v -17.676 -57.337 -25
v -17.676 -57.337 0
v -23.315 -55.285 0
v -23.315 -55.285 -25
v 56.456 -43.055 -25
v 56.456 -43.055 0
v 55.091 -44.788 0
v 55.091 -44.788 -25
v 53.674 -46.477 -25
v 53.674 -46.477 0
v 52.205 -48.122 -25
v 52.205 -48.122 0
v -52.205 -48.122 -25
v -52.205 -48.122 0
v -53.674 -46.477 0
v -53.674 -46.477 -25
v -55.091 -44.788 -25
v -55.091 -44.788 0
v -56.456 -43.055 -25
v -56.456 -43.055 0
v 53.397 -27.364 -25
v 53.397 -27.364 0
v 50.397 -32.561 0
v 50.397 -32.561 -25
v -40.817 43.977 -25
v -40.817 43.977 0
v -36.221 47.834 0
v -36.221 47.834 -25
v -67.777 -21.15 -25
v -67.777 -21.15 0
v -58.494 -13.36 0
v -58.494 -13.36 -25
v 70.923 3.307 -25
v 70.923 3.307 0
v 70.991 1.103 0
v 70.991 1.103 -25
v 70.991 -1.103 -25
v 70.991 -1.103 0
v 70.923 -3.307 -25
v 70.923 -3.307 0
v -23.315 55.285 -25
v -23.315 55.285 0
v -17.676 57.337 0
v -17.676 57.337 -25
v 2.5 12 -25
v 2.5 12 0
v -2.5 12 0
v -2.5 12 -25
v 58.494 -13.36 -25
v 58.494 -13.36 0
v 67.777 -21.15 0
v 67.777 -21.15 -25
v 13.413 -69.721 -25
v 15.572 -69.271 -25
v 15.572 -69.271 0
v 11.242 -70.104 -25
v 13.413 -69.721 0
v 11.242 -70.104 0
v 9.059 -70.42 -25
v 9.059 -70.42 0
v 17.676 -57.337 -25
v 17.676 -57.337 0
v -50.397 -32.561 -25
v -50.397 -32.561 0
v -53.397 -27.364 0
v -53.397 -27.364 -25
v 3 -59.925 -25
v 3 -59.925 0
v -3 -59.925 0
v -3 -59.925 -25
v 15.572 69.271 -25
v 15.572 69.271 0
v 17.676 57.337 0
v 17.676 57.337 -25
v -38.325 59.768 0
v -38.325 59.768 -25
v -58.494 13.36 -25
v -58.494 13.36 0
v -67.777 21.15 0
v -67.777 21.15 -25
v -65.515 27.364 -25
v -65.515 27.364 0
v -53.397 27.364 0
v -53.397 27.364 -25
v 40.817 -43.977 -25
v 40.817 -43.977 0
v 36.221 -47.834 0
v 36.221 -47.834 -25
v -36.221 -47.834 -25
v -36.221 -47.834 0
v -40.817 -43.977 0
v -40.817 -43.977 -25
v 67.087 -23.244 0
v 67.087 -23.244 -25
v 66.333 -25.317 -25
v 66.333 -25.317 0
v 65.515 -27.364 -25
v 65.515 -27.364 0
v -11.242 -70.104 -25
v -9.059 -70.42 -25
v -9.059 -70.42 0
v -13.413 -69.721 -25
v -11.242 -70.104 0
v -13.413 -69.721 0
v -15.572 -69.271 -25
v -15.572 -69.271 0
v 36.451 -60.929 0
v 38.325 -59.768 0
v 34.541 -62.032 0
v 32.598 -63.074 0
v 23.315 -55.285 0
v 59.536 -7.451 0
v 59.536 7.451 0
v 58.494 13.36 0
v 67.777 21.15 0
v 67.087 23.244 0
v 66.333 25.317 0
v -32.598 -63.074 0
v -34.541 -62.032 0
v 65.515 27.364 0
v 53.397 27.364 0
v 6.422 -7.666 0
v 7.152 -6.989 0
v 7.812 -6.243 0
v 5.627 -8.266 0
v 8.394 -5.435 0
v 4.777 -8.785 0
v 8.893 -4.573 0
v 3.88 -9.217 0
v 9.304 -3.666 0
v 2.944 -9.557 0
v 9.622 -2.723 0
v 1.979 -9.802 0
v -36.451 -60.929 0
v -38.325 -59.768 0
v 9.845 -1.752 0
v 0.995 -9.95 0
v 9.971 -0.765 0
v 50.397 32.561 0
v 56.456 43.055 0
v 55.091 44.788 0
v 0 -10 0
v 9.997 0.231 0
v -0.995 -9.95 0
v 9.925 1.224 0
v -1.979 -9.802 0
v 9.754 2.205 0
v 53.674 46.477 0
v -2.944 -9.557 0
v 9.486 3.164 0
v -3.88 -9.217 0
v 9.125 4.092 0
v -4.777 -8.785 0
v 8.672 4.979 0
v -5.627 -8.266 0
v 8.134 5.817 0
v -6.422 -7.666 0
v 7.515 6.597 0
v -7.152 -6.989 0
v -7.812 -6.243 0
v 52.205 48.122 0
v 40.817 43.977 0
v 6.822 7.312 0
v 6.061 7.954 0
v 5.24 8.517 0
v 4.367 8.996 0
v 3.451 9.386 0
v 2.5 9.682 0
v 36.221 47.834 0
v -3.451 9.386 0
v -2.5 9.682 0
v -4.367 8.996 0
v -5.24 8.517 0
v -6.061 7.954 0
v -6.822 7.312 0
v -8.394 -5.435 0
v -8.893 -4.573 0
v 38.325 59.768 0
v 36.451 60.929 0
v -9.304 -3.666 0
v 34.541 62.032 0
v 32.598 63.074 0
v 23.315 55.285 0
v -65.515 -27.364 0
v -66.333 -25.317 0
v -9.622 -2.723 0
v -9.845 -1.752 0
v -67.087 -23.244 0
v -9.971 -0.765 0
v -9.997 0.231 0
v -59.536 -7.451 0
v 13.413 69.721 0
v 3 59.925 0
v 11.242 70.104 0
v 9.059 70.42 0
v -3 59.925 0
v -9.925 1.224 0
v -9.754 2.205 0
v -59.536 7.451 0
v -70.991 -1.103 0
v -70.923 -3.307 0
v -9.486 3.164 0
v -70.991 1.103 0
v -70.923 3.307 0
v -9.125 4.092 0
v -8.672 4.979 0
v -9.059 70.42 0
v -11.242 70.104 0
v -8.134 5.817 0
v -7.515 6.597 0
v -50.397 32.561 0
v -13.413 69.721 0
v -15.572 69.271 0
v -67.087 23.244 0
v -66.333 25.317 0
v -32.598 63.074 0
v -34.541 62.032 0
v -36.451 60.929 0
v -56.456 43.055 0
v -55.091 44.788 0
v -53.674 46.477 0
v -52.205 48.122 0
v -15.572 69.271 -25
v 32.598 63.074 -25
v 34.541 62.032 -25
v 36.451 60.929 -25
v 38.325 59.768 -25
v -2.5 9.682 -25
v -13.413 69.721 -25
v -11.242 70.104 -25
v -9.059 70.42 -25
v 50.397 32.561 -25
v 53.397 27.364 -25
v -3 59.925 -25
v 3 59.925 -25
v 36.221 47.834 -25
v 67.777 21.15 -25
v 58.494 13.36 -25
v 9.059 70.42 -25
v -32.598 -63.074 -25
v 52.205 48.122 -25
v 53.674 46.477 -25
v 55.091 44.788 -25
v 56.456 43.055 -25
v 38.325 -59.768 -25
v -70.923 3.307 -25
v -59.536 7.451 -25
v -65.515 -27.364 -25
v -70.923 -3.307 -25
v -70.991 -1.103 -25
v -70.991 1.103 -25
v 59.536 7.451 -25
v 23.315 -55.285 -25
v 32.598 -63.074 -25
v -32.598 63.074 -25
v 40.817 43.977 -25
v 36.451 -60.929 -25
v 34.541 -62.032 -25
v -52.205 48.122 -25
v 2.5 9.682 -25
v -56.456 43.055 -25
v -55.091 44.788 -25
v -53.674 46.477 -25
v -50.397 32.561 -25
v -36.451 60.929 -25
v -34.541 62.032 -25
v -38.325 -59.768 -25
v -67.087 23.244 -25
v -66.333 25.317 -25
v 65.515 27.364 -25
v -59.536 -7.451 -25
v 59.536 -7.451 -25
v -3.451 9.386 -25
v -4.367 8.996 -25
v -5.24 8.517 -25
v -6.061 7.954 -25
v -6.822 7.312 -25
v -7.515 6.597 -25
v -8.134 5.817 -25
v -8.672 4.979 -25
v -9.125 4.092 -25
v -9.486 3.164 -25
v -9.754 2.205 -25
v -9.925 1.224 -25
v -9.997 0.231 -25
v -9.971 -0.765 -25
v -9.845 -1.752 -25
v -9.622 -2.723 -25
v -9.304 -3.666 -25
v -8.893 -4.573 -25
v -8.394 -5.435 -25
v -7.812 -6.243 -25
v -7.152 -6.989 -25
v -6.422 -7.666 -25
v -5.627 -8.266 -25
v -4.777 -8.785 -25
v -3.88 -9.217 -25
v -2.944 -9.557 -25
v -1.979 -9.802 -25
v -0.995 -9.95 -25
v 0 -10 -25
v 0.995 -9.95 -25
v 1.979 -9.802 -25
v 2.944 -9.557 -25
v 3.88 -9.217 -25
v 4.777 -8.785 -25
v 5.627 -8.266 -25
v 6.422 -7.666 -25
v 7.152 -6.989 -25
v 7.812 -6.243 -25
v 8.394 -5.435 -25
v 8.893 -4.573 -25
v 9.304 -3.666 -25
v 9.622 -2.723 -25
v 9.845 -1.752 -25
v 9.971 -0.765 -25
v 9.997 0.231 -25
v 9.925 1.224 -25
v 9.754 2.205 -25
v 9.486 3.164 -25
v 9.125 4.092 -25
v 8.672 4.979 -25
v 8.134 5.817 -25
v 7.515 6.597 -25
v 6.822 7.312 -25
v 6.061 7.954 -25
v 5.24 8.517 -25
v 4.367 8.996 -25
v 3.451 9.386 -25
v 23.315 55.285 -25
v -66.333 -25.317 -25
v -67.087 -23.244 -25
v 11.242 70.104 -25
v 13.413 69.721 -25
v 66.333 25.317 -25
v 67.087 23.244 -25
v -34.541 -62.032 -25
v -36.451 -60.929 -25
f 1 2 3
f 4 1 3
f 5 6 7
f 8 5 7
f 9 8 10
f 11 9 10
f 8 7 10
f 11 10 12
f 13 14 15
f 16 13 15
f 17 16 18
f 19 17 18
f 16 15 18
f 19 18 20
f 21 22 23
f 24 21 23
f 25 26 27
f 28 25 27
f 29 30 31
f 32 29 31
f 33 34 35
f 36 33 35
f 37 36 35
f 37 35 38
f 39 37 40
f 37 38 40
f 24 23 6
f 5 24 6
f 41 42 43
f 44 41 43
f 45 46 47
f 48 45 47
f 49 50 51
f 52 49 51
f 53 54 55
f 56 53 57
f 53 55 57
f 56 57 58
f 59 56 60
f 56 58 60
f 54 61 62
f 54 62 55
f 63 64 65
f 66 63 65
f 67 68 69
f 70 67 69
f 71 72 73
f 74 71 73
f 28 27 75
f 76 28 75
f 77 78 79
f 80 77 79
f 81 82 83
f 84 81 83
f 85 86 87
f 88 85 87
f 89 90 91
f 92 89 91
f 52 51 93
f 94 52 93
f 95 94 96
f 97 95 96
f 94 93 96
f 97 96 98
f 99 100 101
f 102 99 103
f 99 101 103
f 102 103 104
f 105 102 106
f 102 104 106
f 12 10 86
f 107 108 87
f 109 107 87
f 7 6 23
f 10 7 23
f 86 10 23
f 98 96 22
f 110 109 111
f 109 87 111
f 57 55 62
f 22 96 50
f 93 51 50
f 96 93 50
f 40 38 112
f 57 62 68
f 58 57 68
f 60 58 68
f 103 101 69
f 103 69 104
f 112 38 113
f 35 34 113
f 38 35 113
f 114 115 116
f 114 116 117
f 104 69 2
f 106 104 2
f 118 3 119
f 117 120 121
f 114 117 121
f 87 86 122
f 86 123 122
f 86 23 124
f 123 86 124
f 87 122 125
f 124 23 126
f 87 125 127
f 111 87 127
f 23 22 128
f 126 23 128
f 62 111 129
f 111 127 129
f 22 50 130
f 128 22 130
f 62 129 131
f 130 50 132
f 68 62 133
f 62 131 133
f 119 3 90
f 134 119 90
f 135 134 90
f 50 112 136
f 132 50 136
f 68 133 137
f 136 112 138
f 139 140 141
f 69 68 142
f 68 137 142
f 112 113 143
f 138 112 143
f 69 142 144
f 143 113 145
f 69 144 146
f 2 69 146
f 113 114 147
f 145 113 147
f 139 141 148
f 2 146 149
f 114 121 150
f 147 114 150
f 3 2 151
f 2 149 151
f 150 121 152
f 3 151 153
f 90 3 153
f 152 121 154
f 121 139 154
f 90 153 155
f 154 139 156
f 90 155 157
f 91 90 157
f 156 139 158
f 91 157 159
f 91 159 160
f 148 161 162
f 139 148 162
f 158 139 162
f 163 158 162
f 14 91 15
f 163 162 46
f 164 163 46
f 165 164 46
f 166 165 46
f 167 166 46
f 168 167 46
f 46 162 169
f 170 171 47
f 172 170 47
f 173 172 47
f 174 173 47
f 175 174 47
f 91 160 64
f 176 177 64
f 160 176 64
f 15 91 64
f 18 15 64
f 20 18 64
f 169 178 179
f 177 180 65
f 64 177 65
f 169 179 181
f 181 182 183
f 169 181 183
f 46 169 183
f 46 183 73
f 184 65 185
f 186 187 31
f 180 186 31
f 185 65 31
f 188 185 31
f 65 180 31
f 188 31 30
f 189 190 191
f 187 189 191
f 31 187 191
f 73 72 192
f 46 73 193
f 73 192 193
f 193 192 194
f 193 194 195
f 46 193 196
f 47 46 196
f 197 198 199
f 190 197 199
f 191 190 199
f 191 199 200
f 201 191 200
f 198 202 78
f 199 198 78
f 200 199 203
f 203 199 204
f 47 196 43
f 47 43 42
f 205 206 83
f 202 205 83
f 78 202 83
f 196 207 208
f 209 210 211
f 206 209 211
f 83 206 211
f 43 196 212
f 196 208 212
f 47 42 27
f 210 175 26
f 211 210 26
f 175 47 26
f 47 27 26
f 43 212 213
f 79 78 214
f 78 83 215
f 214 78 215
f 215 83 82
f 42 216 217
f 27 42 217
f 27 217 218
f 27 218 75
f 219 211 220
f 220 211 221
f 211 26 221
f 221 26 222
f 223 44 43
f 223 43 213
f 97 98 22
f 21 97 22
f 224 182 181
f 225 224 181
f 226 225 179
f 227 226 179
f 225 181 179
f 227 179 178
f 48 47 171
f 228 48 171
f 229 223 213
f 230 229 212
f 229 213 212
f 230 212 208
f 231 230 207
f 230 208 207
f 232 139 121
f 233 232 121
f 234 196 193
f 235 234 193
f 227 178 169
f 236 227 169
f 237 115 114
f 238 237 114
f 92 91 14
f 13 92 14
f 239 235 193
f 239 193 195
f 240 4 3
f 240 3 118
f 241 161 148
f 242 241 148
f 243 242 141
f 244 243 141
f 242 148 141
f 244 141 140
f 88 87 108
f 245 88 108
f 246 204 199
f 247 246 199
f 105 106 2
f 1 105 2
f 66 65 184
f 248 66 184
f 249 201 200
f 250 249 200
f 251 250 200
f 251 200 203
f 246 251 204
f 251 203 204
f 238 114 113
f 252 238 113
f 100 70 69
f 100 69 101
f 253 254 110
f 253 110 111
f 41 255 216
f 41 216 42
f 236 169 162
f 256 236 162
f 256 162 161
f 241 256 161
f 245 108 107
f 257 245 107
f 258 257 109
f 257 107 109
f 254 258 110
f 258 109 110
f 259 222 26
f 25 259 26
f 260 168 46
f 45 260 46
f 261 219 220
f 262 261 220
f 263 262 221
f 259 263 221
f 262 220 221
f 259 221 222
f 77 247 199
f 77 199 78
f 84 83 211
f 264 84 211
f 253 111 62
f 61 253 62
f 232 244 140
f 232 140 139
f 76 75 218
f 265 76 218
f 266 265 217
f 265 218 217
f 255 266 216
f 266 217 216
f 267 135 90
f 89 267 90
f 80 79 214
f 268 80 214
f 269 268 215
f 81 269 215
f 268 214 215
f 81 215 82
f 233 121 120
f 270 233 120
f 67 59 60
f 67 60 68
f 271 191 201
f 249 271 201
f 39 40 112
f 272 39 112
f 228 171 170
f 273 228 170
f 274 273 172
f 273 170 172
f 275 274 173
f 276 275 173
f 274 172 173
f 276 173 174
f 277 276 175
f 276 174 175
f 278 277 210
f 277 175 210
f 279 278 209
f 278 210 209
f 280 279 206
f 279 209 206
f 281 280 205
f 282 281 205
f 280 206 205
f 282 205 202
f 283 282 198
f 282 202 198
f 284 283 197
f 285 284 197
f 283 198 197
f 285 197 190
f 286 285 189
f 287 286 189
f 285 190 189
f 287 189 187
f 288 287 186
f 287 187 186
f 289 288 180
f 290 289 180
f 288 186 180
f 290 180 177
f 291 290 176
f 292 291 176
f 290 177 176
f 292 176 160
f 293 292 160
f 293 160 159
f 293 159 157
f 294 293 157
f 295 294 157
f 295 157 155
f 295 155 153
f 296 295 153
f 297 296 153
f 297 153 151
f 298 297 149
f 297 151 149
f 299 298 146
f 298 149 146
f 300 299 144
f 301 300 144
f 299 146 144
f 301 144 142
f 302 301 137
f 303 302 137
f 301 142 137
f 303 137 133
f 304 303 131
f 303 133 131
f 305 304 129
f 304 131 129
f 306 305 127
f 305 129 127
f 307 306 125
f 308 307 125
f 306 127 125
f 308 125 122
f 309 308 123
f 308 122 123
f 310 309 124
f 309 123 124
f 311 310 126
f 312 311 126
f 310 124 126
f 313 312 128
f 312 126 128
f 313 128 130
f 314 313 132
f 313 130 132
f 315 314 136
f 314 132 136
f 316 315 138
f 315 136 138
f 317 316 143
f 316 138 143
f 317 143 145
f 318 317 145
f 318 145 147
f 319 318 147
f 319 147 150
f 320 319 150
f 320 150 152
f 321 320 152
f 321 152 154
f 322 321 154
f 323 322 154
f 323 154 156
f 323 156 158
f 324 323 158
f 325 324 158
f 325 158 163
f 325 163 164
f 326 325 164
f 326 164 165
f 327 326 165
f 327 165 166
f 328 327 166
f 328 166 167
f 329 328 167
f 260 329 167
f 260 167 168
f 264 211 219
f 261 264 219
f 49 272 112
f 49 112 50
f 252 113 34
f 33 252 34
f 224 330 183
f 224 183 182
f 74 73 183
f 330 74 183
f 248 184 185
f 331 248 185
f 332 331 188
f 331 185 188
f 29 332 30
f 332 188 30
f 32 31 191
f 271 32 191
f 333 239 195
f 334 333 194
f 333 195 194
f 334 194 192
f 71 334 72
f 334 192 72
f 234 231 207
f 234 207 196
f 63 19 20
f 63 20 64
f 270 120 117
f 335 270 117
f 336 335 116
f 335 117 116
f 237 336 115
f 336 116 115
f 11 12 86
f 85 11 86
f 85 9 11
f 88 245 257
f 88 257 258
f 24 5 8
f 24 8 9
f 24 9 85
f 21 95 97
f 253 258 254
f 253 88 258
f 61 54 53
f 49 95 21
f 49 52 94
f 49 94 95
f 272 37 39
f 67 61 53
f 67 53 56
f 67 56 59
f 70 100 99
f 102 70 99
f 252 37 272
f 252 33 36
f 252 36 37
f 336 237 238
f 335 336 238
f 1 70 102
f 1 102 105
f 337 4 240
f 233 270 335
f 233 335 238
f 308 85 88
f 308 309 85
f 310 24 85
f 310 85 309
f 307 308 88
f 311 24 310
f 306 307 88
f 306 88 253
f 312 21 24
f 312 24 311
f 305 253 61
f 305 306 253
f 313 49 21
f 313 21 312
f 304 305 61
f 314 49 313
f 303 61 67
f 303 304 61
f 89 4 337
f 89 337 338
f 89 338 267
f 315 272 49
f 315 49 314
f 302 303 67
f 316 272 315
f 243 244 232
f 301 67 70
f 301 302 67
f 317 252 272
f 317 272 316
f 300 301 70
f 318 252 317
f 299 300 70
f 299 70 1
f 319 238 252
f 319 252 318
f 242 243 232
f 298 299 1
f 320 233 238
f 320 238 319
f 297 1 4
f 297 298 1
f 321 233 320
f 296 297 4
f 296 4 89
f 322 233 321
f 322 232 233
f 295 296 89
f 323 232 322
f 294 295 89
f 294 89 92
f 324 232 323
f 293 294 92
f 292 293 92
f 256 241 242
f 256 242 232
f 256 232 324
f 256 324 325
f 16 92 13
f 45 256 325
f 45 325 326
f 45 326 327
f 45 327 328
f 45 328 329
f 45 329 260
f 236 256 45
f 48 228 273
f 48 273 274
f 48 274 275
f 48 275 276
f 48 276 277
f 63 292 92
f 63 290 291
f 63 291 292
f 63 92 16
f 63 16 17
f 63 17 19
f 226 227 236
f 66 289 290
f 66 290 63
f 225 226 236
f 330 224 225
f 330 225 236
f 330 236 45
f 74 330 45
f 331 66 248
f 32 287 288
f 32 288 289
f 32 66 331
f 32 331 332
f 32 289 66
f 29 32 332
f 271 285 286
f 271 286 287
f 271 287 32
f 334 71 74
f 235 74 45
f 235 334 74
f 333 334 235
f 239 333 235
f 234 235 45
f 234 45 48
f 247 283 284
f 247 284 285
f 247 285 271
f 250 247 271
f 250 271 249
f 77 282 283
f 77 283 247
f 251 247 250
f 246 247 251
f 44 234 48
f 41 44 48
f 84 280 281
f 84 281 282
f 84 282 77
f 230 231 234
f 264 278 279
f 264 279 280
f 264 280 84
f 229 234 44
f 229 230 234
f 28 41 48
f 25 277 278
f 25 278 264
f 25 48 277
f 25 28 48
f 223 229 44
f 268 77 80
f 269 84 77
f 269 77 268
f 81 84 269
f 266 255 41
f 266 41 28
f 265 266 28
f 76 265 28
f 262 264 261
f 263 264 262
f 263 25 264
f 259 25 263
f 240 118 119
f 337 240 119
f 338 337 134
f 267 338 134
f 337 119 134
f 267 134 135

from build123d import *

# Parameters (mm, degrees)
BOSS_EXTRUDE1_DEPTH = 25


with BuildPart() as part:
    # Sketch1 → Boss-Extrude1 (new body)
    with BuildSketch(Plane.XY):
        with BuildLine():
            Line((-3, 59.924953066), (3, 59.924953066))
            Line((3, 59.924953066), (9.05913636, 70.419685092))
            ThreePointArc((9.05913636, 70.419685092), (12.329020614, 69.921350464), (15.5721472, 69.271265555))
            Line((15.5721472, 69.271265555), (17.676463174, 57.337096627))
            Line((17.676463174, 57.337096627), (23.314618899, 55.284975767))
            Line((23.314618899, 55.284975767), (32.597754376, 63.074451322))
            ThreePointArc((32.597754376, 63.074451322), (35.5, 61.487803669), (38.325199987, 59.767709057))
            Line((38.325199987, 59.767709057), (36.220884013, 47.83354013))
            Line((36.220884013, 47.83354013), (40.817150671, 43.976814472))
            Line((40.817150671, 43.976814472), (52.204602123, 48.121507844))
            ThreePointArc((52.204602123, 48.121507844), (54.389155461, 45.637920288), (56.455668036, 43.05528477))
            Line((56.455668036, 43.05528477), (50.396531676, 32.560552745))
            Line((50.396531676, 32.560552745), (53.396531676, 27.364400322))
            Line((53.396531676, 27.364400322), (65.514804396, 27.364400322))
            ThreePointArc((65.514804396, 27.364400322), (66.718176076, 24.283430176), (67.776749323, 21.149757711))
            Line((67.776749323, 21.149757711), (58.493613846, 13.360282156))
            Line((58.493613846, 13.360282156), (59.535502912, 7.451435638))
            Line((59.535502912, 7.451435638), (70.922954363, 3.306742265))
            ThreePointArc((70.922954363, 3.306742265), (71, 0), (70.922954363, -3.306742265))
            Line((70.922954363, -3.306742265), (59.535502912, -7.451435638))
            Line((59.535502912, -7.451435638), (58.493613846, -13.360282156))
            Line((58.493613846, -13.360282156), (67.776749323, -21.149757711))
            ThreePointArc((67.776749323, -21.149757711), (66.718176076, -24.283430176), (65.514804396, -27.364400322))
            Line((65.514804396, -27.364400322), (53.396531676, -27.364400322))
            Line((53.396531676, -27.364400322), (50.396531676, -32.560552745))
            Line((50.396531676, -32.560552745), (56.455668036, -43.05528477))
            ThreePointArc((56.455668036, -43.05528477), (54.389155461, -45.637920288), (52.204602123, -48.121507844))
            Line((52.204602123, -48.121507844), (40.817150671, -43.976814472))
            Line((40.817150671, -43.976814472), (36.220884013, -47.83354013))
            Line((36.220884013, -47.83354013), (38.325199987, -59.767709057))
            ThreePointArc((38.325199987, -59.767709057), (35.5, -61.487803669), (32.597754376, -63.074451322))
            Line((32.597754376, -63.074451322), (23.314618899, -55.284975767))
            Line((23.314618899, -55.284975767), (17.676463174, -57.337096627))
            Line((17.676463174, -57.337096627), (15.5721472, -69.271265555))
            ThreePointArc((15.5721472, -69.271265555), (12.329020614, -69.921350464), (9.05913636, -70.419685092))
            Line((9.05913636, -70.419685092), (3, -59.924953066))
            Line((3, -59.924953066), (-3, -59.924953066))
            Line((-3, -59.924953066), (-9.05913636, -70.419685092))
            ThreePointArc((-9.05913636, -70.419685092), (-12.329020614, -69.921350464), (-15.5721472, -69.271265555))
            Line((-15.5721472, -69.271265555), (-17.676463174, -57.337096627))
            Line((-17.676463174, -57.337096627), (-23.314618899, -55.284975767))
            Line((-23.314618899, -55.284975767), (-32.597754376, -63.074451322))
            ThreePointArc((-32.597754376, -63.074451322), (-35.5, -61.487803669), (-38.325199987, -59.767709057))
            Line((-38.325199987, -59.767709057), (-36.220884013, -47.83354013))
            Line((-36.220884013, -47.83354013), (-40.817150671, -43.976814472))
            Line((-40.817150671, -43.976814472), (-52.204602123, -48.121507844))
            ThreePointArc((-52.204602123, -48.121507844), (-54.389155461, -45.637920288), (-56.455668036, -43.05528477))
            Line((-56.455668036, -43.05528477), (-50.396531676, -32.560552745))
            Line((-50.396531676, -32.560552745), (-53.396531676, -27.364400322))
            Line((-53.396531676, -27.364400322), (-65.514804396, -27.364400322))
            ThreePointArc((-65.514804396, -27.364400322), (-66.718176076, -24.283430176), (-67.776749323, -21.149757711))
            Line((-67.776749323, -21.149757711), (-58.493613846, -13.360282156))
            Line((-58.493613846, -13.360282156), (-59.535502912, -7.451435638))
            Line((-59.535502912, -7.451435638), (-70.922954363, -3.306742265))
            ThreePointArc((-70.922954363, -3.306742265), (-71, 0), (-70.922954363, 3.306742265))
            Line((-70.922954363, 3.306742265), (-59.535502912, 7.451435638))
            Line((-59.535502912, 7.451435638), (-58.493613846, 13.360282156))
            Line((-58.493613846, 13.360282156), (-67.776749323, 21.149757711))
            ThreePointArc((-67.776749323, 21.149757711), (-66.718176076, 24.283430176), (-65.514804396, 27.364400322))
            Line((-65.514804396, 27.364400322), (-53.396531676, 27.364400322))
            Line((-53.396531676, 27.364400322), (-50.396531676, 32.560552745))
            Line((-50.396531676, 32.560552745), (-56.455668036, 43.05528477))
            ThreePointArc((-56.455668036, 43.05528477), (-54.389155461, 45.637920288), (-52.204602123, 48.121507844))
            Line((-52.204602123, 48.121507844), (-40.817150671, 43.976814472))
            Line((-40.817150671, 43.976814472), (-36.220884013, 47.83354013))
            Line((-36.220884013, 47.83354013), (-38.325199987, 59.767709057))
            ThreePointArc((-38.325199987, 59.767709057), (-35.5, 61.487803669), (-32.597754376, 63.074451322))
            Line((-32.597754376, 63.074451322), (-23.314618899, 55.284975767))
            Line((-23.314618899, 55.284975767), (-17.676463174, 57.337096627))
            Line((-17.676463174, 57.337096627), (-15.5721472, 69.271265555))
            ThreePointArc((-15.5721472, 69.271265555), (-12.329020614, 69.921350464), (-9.05913636, 70.419685092))
            Line((-9.05913636, 70.419685092), (-3, 59.924953066))
        make_face()
        with BuildLine():
            Line((2.5, 9.682458366), (2.5, 12))
            Line((2.5, 12), (-2.5, 12))
            Line((-2.5, 12), (-2.5, 9.682458366))
            ThreePointArc((-2.5, 9.682458366), (0, -10), (2.5, 9.682458366))
        make_face(mode=Mode.SUBTRACT)
    extrude(amount=-BOSS_EXTRUDE1_DEPTH)


solid = part.part
